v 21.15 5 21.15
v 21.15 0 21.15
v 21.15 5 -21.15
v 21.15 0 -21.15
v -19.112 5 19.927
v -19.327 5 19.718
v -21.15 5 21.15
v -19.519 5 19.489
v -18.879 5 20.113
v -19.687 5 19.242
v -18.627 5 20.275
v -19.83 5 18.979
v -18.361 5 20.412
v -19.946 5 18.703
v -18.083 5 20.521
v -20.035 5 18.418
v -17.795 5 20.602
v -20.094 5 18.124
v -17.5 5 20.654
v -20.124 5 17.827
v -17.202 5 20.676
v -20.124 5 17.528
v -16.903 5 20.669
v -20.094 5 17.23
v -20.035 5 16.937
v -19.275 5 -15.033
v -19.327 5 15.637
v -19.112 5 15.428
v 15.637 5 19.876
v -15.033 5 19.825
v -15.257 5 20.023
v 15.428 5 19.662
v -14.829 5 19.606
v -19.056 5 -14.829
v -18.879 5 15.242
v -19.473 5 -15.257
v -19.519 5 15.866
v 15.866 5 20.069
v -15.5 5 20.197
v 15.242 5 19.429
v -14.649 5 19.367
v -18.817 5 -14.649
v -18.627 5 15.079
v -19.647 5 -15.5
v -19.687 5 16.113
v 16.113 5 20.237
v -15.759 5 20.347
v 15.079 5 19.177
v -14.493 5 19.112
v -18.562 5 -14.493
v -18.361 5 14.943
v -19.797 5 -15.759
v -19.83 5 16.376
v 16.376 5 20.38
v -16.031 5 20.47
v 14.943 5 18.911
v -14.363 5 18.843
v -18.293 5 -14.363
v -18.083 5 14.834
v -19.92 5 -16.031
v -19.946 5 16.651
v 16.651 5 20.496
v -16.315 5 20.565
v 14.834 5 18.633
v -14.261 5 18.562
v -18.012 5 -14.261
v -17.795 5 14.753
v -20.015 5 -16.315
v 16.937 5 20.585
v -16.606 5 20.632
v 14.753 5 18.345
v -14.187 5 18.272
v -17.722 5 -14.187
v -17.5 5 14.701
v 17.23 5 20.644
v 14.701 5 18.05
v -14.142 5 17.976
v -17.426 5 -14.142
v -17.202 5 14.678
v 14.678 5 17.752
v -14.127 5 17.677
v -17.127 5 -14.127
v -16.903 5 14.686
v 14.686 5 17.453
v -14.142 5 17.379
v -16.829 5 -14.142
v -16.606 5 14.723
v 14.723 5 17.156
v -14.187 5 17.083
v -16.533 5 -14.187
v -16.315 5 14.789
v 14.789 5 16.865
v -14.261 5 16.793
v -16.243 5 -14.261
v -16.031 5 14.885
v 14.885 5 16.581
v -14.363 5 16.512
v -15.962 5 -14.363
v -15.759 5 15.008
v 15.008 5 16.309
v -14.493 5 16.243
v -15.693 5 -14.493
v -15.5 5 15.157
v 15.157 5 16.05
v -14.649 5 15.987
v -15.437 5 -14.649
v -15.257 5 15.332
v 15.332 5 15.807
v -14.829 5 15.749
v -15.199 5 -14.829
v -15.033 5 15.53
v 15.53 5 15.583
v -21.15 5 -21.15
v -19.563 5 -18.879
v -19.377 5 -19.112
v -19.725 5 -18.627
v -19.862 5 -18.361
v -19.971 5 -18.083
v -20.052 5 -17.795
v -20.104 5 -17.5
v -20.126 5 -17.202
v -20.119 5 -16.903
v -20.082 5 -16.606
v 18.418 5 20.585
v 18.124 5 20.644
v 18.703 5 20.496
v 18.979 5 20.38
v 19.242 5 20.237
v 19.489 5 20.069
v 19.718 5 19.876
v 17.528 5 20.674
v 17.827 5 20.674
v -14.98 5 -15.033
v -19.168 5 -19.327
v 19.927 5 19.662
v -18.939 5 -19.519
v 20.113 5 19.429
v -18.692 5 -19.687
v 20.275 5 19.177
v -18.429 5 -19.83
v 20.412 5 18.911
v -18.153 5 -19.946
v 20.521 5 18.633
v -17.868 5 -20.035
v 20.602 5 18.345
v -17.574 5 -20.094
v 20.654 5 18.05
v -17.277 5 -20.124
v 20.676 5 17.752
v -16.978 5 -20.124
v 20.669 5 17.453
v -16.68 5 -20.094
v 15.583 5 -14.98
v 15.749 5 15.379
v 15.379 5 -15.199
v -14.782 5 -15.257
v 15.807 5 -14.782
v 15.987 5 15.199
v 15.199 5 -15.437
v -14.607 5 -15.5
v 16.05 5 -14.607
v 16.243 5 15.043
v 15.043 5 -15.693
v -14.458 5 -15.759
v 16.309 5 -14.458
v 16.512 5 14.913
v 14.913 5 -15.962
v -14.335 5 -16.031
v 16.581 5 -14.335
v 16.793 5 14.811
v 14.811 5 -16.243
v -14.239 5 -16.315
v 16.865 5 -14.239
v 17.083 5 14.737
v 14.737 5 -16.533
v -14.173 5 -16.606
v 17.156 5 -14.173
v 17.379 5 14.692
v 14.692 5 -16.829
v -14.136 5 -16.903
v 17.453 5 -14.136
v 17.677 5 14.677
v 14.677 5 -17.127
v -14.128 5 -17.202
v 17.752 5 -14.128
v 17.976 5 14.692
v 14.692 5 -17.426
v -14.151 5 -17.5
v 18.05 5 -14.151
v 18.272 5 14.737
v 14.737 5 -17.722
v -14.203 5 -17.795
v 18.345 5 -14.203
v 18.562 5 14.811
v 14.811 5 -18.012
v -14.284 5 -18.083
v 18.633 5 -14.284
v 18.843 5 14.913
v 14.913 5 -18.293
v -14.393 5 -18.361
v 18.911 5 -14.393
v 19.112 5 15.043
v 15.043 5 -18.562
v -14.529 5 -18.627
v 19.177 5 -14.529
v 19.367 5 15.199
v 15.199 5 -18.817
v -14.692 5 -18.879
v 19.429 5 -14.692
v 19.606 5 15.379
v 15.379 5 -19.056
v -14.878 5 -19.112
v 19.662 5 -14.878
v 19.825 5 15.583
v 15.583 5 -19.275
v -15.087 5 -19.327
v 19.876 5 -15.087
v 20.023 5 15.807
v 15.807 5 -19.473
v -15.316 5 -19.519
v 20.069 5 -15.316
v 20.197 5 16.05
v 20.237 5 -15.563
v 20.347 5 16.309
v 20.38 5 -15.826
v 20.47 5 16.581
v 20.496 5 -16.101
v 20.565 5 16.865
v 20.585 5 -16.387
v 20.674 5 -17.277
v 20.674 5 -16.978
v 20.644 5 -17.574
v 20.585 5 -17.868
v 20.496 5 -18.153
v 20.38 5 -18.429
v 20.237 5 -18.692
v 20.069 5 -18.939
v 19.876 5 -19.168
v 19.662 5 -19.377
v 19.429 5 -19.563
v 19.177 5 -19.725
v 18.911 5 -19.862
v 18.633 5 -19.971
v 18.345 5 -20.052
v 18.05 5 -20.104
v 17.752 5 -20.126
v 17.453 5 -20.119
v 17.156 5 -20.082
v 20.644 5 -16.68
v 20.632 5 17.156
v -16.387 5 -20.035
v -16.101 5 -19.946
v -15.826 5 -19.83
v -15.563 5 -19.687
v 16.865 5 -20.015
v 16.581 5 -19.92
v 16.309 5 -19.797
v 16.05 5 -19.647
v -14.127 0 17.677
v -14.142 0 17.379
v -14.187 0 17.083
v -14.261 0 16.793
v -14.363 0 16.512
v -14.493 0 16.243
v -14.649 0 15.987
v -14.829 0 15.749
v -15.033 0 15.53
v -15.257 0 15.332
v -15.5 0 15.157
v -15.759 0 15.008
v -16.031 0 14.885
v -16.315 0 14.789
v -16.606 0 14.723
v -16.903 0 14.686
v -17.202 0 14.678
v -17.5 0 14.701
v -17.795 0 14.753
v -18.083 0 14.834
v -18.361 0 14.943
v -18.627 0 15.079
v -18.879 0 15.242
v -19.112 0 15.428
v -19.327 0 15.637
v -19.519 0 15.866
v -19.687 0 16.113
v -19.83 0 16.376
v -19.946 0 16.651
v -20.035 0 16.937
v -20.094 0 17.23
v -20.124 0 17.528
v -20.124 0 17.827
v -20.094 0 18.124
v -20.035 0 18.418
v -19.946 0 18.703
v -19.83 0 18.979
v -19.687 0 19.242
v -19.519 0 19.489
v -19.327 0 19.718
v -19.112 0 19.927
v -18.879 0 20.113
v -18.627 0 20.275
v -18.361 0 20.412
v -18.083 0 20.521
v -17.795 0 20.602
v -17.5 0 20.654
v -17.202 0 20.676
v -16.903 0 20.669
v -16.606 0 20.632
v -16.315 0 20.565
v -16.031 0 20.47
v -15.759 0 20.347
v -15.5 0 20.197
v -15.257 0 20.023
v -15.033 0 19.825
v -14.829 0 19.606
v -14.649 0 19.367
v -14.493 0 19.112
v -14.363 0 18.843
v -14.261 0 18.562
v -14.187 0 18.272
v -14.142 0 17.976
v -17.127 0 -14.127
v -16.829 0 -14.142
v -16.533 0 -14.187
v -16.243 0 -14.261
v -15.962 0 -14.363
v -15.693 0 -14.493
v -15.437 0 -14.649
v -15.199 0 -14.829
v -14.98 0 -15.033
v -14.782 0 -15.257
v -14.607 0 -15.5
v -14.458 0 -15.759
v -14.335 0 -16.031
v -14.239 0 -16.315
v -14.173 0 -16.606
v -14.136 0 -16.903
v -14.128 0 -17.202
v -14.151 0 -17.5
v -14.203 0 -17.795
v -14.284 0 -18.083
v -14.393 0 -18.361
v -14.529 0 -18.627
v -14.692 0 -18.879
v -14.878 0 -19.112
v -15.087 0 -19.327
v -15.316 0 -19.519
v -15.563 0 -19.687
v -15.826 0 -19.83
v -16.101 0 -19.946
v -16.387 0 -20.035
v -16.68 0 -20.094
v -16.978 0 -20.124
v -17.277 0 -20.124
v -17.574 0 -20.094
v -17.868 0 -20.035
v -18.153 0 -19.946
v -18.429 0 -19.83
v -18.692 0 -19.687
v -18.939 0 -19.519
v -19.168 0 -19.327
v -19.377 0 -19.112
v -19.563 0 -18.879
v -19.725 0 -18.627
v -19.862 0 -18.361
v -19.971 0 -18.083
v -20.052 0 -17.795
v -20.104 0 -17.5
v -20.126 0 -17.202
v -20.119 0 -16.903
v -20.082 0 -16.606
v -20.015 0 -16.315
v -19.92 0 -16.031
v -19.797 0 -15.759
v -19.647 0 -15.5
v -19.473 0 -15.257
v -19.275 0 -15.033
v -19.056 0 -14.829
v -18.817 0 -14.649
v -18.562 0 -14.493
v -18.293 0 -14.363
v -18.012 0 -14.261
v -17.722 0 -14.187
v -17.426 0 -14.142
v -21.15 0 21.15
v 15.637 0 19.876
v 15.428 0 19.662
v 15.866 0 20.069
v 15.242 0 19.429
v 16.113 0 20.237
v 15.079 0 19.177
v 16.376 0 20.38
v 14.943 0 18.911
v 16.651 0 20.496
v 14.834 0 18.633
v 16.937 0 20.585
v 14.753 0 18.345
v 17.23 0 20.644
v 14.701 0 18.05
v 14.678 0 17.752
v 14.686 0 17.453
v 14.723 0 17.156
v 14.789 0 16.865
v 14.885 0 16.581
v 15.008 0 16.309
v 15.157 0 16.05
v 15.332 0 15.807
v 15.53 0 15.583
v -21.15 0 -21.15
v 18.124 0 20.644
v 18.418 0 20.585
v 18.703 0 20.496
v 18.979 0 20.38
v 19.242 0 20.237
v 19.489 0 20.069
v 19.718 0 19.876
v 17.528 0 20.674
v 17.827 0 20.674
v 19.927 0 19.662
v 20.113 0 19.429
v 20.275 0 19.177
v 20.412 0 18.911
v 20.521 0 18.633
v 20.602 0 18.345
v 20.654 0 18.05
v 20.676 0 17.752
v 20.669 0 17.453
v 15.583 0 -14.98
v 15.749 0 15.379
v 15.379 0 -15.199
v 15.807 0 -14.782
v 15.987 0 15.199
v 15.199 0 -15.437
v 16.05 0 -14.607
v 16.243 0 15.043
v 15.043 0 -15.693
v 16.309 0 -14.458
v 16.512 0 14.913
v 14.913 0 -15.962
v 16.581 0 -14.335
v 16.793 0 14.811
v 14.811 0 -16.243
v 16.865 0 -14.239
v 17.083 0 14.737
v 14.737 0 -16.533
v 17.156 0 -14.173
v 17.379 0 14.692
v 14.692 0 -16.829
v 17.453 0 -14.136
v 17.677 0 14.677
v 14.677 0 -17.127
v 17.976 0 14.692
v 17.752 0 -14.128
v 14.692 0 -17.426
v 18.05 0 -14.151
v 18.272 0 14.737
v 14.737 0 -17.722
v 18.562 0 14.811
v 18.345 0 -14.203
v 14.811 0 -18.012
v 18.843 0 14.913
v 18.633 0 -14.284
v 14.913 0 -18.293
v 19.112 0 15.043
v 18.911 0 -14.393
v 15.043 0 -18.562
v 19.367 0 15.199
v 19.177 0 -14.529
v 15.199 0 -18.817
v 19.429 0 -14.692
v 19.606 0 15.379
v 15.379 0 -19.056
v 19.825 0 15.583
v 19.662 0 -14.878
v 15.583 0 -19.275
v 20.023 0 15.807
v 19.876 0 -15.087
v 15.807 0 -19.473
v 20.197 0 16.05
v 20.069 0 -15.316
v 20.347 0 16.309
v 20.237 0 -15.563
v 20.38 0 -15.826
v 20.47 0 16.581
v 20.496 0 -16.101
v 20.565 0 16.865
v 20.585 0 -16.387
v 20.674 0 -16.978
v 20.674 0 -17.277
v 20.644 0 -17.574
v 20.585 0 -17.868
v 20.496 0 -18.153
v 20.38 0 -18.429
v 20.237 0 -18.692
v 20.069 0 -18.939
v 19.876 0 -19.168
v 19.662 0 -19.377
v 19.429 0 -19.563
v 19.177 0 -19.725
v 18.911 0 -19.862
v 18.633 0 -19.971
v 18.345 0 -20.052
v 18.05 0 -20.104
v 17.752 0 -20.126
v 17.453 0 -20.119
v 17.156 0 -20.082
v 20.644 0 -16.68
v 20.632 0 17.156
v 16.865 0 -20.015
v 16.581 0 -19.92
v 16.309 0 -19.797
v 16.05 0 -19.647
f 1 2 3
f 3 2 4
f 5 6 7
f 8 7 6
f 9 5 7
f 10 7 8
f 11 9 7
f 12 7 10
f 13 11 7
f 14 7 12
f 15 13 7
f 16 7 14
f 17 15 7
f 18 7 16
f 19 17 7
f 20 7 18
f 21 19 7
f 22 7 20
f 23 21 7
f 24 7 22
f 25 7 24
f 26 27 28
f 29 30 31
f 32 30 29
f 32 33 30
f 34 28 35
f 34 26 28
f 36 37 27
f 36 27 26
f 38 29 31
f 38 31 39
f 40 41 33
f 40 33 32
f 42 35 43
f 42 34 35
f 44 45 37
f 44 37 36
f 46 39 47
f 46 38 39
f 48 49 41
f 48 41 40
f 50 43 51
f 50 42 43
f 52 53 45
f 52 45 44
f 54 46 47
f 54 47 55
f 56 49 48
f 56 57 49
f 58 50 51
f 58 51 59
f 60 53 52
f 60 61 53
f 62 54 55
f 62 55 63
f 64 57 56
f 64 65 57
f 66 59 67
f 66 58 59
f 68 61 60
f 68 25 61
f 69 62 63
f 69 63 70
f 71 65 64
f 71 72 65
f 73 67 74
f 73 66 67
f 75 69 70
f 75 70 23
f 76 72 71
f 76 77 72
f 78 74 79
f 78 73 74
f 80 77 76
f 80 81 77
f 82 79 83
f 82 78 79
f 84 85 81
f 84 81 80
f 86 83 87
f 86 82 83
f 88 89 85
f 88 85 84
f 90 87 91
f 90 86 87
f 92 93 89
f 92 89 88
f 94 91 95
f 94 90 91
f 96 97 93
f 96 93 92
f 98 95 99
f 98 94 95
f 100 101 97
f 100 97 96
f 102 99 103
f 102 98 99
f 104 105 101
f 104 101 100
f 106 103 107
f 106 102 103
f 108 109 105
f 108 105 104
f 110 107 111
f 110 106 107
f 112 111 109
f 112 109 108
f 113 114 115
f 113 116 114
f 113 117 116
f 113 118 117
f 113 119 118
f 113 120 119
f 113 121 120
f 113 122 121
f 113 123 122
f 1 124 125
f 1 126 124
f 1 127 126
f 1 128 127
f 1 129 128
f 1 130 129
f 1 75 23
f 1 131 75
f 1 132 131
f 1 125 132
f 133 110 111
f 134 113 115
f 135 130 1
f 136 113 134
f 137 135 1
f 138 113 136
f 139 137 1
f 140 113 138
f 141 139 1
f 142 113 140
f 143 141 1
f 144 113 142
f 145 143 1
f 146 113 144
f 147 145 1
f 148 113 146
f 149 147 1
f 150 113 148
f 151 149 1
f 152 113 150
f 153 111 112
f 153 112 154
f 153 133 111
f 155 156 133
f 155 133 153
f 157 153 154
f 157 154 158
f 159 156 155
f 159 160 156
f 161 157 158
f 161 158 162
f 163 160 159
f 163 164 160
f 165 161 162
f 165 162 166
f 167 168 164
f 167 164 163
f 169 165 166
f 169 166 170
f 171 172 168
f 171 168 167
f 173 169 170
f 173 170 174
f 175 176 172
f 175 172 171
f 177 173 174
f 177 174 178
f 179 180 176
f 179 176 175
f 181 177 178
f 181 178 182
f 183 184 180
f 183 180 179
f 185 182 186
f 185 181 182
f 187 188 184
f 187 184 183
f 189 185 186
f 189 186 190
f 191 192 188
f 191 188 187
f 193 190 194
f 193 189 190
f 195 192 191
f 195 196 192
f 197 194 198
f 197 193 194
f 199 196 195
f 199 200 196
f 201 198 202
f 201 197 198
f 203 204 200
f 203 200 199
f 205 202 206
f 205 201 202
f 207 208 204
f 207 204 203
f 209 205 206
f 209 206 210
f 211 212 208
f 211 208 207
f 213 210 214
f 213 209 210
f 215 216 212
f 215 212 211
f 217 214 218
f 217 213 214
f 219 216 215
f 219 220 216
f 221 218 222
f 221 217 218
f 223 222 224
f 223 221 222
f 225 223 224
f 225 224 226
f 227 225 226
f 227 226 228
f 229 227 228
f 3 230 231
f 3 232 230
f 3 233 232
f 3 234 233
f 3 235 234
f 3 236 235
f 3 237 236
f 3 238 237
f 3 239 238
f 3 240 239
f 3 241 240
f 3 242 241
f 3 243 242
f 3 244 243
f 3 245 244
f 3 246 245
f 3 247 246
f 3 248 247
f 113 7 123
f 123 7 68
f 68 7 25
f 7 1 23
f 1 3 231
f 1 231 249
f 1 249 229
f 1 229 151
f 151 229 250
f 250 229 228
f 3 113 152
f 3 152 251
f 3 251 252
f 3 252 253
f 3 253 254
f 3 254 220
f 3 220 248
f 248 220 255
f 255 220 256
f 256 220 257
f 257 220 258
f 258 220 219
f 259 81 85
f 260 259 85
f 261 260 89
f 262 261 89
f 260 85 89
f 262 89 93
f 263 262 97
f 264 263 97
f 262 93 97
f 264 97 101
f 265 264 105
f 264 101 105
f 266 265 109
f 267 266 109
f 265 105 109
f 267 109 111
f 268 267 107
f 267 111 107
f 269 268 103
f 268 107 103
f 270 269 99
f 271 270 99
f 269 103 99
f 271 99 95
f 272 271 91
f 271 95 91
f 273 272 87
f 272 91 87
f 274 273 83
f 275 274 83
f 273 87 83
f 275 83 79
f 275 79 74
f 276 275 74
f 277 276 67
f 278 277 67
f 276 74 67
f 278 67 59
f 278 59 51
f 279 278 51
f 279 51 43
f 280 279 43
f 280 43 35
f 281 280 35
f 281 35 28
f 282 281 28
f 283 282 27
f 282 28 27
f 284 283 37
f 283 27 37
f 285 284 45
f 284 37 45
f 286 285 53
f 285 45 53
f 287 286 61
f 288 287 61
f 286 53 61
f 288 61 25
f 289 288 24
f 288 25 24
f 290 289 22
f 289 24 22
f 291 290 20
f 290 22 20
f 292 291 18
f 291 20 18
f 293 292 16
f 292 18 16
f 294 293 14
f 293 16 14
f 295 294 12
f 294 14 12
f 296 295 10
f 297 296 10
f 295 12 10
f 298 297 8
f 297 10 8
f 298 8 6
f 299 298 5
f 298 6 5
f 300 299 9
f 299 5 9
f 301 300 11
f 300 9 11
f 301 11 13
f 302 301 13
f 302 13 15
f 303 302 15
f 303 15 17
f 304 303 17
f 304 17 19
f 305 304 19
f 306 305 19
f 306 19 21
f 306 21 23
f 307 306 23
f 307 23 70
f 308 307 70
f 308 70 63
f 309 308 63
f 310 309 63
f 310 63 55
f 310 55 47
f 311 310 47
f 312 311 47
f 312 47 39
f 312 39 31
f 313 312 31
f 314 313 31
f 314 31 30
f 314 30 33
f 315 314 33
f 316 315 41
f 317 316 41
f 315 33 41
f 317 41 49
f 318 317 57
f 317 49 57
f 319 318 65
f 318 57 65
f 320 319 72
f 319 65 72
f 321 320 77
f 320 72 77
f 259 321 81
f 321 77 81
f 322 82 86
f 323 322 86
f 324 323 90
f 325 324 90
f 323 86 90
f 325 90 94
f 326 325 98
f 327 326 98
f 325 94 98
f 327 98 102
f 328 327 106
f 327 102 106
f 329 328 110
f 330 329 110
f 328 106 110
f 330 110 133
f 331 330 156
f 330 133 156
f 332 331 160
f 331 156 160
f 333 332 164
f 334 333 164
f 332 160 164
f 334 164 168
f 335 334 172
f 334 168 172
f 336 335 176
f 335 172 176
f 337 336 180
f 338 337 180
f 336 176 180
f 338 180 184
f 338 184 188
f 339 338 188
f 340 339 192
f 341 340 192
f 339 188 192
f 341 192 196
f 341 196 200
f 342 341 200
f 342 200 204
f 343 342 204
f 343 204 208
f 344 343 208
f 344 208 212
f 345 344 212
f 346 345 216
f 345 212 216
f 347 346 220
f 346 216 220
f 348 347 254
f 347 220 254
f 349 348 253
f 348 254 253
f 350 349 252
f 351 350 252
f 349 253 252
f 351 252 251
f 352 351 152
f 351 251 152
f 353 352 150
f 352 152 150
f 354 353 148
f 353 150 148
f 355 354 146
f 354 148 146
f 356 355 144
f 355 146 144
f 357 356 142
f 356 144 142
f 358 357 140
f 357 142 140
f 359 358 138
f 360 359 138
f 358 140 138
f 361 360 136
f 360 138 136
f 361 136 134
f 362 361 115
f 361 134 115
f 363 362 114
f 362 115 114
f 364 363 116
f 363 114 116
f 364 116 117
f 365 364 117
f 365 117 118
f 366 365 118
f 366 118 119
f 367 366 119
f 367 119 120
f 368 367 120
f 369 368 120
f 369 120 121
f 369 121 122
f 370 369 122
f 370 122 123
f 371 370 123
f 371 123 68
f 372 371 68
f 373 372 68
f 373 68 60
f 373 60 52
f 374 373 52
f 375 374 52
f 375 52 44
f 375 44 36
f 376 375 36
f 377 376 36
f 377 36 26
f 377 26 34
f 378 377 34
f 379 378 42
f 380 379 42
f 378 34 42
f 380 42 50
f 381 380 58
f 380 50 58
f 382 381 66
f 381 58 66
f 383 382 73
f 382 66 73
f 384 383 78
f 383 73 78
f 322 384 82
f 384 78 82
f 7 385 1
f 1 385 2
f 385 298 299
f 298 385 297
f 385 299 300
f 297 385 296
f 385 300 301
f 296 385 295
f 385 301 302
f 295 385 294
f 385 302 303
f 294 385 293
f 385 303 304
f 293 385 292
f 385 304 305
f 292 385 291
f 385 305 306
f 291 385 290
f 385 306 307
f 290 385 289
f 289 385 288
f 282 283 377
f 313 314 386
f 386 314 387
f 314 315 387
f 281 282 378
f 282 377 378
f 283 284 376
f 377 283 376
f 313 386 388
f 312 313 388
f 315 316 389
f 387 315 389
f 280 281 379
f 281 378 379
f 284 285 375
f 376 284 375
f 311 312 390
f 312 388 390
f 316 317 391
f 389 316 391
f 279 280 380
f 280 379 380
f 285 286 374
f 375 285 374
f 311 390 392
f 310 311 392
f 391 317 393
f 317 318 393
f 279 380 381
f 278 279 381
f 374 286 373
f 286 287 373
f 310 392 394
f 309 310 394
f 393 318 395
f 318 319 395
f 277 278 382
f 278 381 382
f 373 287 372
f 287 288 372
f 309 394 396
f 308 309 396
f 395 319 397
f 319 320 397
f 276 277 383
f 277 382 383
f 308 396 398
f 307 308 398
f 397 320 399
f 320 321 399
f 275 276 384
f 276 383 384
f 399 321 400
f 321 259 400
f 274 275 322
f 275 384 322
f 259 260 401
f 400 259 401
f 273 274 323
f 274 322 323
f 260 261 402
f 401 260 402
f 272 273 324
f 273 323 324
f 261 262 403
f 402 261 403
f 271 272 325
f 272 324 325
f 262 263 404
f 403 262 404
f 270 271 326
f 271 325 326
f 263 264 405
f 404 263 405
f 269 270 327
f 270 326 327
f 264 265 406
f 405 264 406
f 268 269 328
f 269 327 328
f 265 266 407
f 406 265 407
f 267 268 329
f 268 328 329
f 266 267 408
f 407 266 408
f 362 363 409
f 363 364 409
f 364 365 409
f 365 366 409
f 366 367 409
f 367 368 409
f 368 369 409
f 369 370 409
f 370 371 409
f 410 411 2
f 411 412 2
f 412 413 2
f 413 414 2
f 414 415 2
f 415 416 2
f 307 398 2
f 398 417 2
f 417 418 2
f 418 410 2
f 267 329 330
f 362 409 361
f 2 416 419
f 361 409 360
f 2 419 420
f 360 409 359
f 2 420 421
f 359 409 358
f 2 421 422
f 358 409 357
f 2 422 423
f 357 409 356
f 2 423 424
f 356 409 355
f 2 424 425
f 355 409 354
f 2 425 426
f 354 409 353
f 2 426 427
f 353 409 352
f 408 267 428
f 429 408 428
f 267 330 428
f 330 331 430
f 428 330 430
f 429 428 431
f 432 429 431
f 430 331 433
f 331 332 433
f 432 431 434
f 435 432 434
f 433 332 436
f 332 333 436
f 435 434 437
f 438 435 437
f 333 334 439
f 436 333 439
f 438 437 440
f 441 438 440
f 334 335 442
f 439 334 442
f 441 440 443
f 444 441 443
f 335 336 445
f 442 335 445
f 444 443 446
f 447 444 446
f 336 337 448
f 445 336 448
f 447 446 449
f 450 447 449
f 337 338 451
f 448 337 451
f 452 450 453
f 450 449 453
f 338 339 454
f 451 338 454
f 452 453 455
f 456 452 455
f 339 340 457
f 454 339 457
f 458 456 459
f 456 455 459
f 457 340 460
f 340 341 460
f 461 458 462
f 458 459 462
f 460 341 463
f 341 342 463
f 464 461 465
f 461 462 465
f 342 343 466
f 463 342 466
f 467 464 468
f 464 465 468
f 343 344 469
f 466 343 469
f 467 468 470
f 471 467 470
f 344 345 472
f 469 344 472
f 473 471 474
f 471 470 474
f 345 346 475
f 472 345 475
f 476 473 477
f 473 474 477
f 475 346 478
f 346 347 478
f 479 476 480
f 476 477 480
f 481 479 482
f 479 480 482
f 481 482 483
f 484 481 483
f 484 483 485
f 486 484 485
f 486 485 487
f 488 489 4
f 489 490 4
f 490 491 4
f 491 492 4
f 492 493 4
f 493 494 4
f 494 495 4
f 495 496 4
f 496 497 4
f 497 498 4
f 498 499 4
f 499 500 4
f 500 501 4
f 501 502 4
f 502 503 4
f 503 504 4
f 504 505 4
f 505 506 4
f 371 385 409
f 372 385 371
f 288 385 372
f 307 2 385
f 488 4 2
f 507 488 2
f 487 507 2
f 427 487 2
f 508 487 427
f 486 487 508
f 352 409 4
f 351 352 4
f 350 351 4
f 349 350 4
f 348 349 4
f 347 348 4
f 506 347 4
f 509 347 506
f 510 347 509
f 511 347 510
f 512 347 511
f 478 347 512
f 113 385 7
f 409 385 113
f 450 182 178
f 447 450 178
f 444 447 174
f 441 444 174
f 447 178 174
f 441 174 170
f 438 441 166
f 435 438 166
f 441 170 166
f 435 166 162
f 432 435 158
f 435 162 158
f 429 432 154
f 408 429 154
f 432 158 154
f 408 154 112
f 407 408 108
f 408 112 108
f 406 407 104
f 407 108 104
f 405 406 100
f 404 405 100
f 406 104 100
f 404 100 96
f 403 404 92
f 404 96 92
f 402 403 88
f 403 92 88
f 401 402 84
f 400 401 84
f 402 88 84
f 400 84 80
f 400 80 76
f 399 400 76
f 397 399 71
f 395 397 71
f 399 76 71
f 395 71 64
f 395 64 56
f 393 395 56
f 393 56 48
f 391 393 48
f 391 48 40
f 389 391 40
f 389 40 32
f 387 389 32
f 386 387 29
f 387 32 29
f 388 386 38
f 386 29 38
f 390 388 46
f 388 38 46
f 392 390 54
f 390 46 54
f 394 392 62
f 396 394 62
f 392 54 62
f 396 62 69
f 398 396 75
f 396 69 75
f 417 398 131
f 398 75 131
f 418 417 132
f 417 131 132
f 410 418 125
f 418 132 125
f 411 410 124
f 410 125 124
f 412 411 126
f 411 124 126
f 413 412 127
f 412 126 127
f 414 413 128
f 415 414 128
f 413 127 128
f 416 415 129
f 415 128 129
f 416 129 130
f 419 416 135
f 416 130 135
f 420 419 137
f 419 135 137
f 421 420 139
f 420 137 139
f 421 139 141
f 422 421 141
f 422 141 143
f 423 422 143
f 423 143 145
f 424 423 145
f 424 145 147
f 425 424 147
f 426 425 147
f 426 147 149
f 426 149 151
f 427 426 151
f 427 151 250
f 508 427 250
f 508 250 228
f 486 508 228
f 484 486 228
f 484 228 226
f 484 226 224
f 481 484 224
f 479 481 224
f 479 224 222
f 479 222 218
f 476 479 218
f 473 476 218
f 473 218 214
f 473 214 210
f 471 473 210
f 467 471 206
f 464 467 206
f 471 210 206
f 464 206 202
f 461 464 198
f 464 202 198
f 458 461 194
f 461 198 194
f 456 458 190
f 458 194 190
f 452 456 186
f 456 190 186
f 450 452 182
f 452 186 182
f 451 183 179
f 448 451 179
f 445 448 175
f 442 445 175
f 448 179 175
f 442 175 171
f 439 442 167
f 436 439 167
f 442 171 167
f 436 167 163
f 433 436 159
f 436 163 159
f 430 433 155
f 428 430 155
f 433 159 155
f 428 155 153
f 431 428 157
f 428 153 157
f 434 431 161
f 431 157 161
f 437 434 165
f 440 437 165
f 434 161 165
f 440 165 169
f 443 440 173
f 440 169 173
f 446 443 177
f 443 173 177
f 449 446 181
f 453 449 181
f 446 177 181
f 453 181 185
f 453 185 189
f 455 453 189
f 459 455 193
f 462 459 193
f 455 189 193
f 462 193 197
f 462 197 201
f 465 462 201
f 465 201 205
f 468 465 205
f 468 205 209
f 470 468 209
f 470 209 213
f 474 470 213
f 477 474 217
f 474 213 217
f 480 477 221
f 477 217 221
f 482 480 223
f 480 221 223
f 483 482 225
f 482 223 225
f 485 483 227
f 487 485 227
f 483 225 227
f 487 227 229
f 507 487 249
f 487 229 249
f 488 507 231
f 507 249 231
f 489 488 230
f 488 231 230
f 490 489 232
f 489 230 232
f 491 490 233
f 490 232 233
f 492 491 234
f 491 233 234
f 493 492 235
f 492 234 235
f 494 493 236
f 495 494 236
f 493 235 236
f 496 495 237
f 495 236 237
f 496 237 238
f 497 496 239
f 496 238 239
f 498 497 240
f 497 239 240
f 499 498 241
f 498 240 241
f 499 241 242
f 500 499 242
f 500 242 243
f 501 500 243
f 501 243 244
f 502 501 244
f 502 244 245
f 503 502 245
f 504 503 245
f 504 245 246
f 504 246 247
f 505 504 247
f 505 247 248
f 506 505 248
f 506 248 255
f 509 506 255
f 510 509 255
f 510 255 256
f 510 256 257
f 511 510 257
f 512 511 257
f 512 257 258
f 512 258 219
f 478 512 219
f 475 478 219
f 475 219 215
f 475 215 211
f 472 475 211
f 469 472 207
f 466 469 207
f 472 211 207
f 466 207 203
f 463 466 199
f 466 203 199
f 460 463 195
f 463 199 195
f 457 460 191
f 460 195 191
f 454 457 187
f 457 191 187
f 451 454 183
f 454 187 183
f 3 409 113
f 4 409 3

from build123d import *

# Parameters (mm, degrees)
SKETCH1_W           = 42.3
SKETCH1_H           = 42.3
BOSS_EXTRUDE2_DEPTH = 5
SKETCH2_R           = 3
CUT_EXTRUDE1_DEPTH  = 5
CIRPATTERN1_COUNT   = 4


with BuildPart() as part:
    # Sketch1 → Boss-Extrude2 (new body)
    with BuildSketch(Plane(origin=(0, 0, 0), x_dir=(1, 0, 0), z_dir=(0, 1, 0))):
        Rectangle(SKETCH1_W, SKETCH1_H)
    extrude(amount=BOSS_EXTRUDE2_DEPTH)

    # Sketch2 → Cut-Extrude1 (cut)
    with BuildSketch(Plane(origin=(0, 5, 0), x_dir=(1, 0, 0), z_dir=(0, 1, 0))):
        with Locations(Location((-17.127358159, 17.127358159, 0), (0, 0, 270))):
            Circle(SKETCH2_R)
    cut_extrude1 = extrude(amount=-CUT_EXTRUDE1_DEPTH, mode=Mode.SUBTRACT)

    # CirPattern1: Cut-Extrude1 ×4 about axis
    cirpattern1_axis = Axis((0.274991672, 0, 0.274991672), (0, 1, 0))
    for i in range(1, CIRPATTERN1_COUNT):
        add(cut_extrude1.rotate(cirpattern1_axis, i * 360 / CIRPATTERN1_COUNT), mode=Mode.SUBTRACT)


solid = part.part
